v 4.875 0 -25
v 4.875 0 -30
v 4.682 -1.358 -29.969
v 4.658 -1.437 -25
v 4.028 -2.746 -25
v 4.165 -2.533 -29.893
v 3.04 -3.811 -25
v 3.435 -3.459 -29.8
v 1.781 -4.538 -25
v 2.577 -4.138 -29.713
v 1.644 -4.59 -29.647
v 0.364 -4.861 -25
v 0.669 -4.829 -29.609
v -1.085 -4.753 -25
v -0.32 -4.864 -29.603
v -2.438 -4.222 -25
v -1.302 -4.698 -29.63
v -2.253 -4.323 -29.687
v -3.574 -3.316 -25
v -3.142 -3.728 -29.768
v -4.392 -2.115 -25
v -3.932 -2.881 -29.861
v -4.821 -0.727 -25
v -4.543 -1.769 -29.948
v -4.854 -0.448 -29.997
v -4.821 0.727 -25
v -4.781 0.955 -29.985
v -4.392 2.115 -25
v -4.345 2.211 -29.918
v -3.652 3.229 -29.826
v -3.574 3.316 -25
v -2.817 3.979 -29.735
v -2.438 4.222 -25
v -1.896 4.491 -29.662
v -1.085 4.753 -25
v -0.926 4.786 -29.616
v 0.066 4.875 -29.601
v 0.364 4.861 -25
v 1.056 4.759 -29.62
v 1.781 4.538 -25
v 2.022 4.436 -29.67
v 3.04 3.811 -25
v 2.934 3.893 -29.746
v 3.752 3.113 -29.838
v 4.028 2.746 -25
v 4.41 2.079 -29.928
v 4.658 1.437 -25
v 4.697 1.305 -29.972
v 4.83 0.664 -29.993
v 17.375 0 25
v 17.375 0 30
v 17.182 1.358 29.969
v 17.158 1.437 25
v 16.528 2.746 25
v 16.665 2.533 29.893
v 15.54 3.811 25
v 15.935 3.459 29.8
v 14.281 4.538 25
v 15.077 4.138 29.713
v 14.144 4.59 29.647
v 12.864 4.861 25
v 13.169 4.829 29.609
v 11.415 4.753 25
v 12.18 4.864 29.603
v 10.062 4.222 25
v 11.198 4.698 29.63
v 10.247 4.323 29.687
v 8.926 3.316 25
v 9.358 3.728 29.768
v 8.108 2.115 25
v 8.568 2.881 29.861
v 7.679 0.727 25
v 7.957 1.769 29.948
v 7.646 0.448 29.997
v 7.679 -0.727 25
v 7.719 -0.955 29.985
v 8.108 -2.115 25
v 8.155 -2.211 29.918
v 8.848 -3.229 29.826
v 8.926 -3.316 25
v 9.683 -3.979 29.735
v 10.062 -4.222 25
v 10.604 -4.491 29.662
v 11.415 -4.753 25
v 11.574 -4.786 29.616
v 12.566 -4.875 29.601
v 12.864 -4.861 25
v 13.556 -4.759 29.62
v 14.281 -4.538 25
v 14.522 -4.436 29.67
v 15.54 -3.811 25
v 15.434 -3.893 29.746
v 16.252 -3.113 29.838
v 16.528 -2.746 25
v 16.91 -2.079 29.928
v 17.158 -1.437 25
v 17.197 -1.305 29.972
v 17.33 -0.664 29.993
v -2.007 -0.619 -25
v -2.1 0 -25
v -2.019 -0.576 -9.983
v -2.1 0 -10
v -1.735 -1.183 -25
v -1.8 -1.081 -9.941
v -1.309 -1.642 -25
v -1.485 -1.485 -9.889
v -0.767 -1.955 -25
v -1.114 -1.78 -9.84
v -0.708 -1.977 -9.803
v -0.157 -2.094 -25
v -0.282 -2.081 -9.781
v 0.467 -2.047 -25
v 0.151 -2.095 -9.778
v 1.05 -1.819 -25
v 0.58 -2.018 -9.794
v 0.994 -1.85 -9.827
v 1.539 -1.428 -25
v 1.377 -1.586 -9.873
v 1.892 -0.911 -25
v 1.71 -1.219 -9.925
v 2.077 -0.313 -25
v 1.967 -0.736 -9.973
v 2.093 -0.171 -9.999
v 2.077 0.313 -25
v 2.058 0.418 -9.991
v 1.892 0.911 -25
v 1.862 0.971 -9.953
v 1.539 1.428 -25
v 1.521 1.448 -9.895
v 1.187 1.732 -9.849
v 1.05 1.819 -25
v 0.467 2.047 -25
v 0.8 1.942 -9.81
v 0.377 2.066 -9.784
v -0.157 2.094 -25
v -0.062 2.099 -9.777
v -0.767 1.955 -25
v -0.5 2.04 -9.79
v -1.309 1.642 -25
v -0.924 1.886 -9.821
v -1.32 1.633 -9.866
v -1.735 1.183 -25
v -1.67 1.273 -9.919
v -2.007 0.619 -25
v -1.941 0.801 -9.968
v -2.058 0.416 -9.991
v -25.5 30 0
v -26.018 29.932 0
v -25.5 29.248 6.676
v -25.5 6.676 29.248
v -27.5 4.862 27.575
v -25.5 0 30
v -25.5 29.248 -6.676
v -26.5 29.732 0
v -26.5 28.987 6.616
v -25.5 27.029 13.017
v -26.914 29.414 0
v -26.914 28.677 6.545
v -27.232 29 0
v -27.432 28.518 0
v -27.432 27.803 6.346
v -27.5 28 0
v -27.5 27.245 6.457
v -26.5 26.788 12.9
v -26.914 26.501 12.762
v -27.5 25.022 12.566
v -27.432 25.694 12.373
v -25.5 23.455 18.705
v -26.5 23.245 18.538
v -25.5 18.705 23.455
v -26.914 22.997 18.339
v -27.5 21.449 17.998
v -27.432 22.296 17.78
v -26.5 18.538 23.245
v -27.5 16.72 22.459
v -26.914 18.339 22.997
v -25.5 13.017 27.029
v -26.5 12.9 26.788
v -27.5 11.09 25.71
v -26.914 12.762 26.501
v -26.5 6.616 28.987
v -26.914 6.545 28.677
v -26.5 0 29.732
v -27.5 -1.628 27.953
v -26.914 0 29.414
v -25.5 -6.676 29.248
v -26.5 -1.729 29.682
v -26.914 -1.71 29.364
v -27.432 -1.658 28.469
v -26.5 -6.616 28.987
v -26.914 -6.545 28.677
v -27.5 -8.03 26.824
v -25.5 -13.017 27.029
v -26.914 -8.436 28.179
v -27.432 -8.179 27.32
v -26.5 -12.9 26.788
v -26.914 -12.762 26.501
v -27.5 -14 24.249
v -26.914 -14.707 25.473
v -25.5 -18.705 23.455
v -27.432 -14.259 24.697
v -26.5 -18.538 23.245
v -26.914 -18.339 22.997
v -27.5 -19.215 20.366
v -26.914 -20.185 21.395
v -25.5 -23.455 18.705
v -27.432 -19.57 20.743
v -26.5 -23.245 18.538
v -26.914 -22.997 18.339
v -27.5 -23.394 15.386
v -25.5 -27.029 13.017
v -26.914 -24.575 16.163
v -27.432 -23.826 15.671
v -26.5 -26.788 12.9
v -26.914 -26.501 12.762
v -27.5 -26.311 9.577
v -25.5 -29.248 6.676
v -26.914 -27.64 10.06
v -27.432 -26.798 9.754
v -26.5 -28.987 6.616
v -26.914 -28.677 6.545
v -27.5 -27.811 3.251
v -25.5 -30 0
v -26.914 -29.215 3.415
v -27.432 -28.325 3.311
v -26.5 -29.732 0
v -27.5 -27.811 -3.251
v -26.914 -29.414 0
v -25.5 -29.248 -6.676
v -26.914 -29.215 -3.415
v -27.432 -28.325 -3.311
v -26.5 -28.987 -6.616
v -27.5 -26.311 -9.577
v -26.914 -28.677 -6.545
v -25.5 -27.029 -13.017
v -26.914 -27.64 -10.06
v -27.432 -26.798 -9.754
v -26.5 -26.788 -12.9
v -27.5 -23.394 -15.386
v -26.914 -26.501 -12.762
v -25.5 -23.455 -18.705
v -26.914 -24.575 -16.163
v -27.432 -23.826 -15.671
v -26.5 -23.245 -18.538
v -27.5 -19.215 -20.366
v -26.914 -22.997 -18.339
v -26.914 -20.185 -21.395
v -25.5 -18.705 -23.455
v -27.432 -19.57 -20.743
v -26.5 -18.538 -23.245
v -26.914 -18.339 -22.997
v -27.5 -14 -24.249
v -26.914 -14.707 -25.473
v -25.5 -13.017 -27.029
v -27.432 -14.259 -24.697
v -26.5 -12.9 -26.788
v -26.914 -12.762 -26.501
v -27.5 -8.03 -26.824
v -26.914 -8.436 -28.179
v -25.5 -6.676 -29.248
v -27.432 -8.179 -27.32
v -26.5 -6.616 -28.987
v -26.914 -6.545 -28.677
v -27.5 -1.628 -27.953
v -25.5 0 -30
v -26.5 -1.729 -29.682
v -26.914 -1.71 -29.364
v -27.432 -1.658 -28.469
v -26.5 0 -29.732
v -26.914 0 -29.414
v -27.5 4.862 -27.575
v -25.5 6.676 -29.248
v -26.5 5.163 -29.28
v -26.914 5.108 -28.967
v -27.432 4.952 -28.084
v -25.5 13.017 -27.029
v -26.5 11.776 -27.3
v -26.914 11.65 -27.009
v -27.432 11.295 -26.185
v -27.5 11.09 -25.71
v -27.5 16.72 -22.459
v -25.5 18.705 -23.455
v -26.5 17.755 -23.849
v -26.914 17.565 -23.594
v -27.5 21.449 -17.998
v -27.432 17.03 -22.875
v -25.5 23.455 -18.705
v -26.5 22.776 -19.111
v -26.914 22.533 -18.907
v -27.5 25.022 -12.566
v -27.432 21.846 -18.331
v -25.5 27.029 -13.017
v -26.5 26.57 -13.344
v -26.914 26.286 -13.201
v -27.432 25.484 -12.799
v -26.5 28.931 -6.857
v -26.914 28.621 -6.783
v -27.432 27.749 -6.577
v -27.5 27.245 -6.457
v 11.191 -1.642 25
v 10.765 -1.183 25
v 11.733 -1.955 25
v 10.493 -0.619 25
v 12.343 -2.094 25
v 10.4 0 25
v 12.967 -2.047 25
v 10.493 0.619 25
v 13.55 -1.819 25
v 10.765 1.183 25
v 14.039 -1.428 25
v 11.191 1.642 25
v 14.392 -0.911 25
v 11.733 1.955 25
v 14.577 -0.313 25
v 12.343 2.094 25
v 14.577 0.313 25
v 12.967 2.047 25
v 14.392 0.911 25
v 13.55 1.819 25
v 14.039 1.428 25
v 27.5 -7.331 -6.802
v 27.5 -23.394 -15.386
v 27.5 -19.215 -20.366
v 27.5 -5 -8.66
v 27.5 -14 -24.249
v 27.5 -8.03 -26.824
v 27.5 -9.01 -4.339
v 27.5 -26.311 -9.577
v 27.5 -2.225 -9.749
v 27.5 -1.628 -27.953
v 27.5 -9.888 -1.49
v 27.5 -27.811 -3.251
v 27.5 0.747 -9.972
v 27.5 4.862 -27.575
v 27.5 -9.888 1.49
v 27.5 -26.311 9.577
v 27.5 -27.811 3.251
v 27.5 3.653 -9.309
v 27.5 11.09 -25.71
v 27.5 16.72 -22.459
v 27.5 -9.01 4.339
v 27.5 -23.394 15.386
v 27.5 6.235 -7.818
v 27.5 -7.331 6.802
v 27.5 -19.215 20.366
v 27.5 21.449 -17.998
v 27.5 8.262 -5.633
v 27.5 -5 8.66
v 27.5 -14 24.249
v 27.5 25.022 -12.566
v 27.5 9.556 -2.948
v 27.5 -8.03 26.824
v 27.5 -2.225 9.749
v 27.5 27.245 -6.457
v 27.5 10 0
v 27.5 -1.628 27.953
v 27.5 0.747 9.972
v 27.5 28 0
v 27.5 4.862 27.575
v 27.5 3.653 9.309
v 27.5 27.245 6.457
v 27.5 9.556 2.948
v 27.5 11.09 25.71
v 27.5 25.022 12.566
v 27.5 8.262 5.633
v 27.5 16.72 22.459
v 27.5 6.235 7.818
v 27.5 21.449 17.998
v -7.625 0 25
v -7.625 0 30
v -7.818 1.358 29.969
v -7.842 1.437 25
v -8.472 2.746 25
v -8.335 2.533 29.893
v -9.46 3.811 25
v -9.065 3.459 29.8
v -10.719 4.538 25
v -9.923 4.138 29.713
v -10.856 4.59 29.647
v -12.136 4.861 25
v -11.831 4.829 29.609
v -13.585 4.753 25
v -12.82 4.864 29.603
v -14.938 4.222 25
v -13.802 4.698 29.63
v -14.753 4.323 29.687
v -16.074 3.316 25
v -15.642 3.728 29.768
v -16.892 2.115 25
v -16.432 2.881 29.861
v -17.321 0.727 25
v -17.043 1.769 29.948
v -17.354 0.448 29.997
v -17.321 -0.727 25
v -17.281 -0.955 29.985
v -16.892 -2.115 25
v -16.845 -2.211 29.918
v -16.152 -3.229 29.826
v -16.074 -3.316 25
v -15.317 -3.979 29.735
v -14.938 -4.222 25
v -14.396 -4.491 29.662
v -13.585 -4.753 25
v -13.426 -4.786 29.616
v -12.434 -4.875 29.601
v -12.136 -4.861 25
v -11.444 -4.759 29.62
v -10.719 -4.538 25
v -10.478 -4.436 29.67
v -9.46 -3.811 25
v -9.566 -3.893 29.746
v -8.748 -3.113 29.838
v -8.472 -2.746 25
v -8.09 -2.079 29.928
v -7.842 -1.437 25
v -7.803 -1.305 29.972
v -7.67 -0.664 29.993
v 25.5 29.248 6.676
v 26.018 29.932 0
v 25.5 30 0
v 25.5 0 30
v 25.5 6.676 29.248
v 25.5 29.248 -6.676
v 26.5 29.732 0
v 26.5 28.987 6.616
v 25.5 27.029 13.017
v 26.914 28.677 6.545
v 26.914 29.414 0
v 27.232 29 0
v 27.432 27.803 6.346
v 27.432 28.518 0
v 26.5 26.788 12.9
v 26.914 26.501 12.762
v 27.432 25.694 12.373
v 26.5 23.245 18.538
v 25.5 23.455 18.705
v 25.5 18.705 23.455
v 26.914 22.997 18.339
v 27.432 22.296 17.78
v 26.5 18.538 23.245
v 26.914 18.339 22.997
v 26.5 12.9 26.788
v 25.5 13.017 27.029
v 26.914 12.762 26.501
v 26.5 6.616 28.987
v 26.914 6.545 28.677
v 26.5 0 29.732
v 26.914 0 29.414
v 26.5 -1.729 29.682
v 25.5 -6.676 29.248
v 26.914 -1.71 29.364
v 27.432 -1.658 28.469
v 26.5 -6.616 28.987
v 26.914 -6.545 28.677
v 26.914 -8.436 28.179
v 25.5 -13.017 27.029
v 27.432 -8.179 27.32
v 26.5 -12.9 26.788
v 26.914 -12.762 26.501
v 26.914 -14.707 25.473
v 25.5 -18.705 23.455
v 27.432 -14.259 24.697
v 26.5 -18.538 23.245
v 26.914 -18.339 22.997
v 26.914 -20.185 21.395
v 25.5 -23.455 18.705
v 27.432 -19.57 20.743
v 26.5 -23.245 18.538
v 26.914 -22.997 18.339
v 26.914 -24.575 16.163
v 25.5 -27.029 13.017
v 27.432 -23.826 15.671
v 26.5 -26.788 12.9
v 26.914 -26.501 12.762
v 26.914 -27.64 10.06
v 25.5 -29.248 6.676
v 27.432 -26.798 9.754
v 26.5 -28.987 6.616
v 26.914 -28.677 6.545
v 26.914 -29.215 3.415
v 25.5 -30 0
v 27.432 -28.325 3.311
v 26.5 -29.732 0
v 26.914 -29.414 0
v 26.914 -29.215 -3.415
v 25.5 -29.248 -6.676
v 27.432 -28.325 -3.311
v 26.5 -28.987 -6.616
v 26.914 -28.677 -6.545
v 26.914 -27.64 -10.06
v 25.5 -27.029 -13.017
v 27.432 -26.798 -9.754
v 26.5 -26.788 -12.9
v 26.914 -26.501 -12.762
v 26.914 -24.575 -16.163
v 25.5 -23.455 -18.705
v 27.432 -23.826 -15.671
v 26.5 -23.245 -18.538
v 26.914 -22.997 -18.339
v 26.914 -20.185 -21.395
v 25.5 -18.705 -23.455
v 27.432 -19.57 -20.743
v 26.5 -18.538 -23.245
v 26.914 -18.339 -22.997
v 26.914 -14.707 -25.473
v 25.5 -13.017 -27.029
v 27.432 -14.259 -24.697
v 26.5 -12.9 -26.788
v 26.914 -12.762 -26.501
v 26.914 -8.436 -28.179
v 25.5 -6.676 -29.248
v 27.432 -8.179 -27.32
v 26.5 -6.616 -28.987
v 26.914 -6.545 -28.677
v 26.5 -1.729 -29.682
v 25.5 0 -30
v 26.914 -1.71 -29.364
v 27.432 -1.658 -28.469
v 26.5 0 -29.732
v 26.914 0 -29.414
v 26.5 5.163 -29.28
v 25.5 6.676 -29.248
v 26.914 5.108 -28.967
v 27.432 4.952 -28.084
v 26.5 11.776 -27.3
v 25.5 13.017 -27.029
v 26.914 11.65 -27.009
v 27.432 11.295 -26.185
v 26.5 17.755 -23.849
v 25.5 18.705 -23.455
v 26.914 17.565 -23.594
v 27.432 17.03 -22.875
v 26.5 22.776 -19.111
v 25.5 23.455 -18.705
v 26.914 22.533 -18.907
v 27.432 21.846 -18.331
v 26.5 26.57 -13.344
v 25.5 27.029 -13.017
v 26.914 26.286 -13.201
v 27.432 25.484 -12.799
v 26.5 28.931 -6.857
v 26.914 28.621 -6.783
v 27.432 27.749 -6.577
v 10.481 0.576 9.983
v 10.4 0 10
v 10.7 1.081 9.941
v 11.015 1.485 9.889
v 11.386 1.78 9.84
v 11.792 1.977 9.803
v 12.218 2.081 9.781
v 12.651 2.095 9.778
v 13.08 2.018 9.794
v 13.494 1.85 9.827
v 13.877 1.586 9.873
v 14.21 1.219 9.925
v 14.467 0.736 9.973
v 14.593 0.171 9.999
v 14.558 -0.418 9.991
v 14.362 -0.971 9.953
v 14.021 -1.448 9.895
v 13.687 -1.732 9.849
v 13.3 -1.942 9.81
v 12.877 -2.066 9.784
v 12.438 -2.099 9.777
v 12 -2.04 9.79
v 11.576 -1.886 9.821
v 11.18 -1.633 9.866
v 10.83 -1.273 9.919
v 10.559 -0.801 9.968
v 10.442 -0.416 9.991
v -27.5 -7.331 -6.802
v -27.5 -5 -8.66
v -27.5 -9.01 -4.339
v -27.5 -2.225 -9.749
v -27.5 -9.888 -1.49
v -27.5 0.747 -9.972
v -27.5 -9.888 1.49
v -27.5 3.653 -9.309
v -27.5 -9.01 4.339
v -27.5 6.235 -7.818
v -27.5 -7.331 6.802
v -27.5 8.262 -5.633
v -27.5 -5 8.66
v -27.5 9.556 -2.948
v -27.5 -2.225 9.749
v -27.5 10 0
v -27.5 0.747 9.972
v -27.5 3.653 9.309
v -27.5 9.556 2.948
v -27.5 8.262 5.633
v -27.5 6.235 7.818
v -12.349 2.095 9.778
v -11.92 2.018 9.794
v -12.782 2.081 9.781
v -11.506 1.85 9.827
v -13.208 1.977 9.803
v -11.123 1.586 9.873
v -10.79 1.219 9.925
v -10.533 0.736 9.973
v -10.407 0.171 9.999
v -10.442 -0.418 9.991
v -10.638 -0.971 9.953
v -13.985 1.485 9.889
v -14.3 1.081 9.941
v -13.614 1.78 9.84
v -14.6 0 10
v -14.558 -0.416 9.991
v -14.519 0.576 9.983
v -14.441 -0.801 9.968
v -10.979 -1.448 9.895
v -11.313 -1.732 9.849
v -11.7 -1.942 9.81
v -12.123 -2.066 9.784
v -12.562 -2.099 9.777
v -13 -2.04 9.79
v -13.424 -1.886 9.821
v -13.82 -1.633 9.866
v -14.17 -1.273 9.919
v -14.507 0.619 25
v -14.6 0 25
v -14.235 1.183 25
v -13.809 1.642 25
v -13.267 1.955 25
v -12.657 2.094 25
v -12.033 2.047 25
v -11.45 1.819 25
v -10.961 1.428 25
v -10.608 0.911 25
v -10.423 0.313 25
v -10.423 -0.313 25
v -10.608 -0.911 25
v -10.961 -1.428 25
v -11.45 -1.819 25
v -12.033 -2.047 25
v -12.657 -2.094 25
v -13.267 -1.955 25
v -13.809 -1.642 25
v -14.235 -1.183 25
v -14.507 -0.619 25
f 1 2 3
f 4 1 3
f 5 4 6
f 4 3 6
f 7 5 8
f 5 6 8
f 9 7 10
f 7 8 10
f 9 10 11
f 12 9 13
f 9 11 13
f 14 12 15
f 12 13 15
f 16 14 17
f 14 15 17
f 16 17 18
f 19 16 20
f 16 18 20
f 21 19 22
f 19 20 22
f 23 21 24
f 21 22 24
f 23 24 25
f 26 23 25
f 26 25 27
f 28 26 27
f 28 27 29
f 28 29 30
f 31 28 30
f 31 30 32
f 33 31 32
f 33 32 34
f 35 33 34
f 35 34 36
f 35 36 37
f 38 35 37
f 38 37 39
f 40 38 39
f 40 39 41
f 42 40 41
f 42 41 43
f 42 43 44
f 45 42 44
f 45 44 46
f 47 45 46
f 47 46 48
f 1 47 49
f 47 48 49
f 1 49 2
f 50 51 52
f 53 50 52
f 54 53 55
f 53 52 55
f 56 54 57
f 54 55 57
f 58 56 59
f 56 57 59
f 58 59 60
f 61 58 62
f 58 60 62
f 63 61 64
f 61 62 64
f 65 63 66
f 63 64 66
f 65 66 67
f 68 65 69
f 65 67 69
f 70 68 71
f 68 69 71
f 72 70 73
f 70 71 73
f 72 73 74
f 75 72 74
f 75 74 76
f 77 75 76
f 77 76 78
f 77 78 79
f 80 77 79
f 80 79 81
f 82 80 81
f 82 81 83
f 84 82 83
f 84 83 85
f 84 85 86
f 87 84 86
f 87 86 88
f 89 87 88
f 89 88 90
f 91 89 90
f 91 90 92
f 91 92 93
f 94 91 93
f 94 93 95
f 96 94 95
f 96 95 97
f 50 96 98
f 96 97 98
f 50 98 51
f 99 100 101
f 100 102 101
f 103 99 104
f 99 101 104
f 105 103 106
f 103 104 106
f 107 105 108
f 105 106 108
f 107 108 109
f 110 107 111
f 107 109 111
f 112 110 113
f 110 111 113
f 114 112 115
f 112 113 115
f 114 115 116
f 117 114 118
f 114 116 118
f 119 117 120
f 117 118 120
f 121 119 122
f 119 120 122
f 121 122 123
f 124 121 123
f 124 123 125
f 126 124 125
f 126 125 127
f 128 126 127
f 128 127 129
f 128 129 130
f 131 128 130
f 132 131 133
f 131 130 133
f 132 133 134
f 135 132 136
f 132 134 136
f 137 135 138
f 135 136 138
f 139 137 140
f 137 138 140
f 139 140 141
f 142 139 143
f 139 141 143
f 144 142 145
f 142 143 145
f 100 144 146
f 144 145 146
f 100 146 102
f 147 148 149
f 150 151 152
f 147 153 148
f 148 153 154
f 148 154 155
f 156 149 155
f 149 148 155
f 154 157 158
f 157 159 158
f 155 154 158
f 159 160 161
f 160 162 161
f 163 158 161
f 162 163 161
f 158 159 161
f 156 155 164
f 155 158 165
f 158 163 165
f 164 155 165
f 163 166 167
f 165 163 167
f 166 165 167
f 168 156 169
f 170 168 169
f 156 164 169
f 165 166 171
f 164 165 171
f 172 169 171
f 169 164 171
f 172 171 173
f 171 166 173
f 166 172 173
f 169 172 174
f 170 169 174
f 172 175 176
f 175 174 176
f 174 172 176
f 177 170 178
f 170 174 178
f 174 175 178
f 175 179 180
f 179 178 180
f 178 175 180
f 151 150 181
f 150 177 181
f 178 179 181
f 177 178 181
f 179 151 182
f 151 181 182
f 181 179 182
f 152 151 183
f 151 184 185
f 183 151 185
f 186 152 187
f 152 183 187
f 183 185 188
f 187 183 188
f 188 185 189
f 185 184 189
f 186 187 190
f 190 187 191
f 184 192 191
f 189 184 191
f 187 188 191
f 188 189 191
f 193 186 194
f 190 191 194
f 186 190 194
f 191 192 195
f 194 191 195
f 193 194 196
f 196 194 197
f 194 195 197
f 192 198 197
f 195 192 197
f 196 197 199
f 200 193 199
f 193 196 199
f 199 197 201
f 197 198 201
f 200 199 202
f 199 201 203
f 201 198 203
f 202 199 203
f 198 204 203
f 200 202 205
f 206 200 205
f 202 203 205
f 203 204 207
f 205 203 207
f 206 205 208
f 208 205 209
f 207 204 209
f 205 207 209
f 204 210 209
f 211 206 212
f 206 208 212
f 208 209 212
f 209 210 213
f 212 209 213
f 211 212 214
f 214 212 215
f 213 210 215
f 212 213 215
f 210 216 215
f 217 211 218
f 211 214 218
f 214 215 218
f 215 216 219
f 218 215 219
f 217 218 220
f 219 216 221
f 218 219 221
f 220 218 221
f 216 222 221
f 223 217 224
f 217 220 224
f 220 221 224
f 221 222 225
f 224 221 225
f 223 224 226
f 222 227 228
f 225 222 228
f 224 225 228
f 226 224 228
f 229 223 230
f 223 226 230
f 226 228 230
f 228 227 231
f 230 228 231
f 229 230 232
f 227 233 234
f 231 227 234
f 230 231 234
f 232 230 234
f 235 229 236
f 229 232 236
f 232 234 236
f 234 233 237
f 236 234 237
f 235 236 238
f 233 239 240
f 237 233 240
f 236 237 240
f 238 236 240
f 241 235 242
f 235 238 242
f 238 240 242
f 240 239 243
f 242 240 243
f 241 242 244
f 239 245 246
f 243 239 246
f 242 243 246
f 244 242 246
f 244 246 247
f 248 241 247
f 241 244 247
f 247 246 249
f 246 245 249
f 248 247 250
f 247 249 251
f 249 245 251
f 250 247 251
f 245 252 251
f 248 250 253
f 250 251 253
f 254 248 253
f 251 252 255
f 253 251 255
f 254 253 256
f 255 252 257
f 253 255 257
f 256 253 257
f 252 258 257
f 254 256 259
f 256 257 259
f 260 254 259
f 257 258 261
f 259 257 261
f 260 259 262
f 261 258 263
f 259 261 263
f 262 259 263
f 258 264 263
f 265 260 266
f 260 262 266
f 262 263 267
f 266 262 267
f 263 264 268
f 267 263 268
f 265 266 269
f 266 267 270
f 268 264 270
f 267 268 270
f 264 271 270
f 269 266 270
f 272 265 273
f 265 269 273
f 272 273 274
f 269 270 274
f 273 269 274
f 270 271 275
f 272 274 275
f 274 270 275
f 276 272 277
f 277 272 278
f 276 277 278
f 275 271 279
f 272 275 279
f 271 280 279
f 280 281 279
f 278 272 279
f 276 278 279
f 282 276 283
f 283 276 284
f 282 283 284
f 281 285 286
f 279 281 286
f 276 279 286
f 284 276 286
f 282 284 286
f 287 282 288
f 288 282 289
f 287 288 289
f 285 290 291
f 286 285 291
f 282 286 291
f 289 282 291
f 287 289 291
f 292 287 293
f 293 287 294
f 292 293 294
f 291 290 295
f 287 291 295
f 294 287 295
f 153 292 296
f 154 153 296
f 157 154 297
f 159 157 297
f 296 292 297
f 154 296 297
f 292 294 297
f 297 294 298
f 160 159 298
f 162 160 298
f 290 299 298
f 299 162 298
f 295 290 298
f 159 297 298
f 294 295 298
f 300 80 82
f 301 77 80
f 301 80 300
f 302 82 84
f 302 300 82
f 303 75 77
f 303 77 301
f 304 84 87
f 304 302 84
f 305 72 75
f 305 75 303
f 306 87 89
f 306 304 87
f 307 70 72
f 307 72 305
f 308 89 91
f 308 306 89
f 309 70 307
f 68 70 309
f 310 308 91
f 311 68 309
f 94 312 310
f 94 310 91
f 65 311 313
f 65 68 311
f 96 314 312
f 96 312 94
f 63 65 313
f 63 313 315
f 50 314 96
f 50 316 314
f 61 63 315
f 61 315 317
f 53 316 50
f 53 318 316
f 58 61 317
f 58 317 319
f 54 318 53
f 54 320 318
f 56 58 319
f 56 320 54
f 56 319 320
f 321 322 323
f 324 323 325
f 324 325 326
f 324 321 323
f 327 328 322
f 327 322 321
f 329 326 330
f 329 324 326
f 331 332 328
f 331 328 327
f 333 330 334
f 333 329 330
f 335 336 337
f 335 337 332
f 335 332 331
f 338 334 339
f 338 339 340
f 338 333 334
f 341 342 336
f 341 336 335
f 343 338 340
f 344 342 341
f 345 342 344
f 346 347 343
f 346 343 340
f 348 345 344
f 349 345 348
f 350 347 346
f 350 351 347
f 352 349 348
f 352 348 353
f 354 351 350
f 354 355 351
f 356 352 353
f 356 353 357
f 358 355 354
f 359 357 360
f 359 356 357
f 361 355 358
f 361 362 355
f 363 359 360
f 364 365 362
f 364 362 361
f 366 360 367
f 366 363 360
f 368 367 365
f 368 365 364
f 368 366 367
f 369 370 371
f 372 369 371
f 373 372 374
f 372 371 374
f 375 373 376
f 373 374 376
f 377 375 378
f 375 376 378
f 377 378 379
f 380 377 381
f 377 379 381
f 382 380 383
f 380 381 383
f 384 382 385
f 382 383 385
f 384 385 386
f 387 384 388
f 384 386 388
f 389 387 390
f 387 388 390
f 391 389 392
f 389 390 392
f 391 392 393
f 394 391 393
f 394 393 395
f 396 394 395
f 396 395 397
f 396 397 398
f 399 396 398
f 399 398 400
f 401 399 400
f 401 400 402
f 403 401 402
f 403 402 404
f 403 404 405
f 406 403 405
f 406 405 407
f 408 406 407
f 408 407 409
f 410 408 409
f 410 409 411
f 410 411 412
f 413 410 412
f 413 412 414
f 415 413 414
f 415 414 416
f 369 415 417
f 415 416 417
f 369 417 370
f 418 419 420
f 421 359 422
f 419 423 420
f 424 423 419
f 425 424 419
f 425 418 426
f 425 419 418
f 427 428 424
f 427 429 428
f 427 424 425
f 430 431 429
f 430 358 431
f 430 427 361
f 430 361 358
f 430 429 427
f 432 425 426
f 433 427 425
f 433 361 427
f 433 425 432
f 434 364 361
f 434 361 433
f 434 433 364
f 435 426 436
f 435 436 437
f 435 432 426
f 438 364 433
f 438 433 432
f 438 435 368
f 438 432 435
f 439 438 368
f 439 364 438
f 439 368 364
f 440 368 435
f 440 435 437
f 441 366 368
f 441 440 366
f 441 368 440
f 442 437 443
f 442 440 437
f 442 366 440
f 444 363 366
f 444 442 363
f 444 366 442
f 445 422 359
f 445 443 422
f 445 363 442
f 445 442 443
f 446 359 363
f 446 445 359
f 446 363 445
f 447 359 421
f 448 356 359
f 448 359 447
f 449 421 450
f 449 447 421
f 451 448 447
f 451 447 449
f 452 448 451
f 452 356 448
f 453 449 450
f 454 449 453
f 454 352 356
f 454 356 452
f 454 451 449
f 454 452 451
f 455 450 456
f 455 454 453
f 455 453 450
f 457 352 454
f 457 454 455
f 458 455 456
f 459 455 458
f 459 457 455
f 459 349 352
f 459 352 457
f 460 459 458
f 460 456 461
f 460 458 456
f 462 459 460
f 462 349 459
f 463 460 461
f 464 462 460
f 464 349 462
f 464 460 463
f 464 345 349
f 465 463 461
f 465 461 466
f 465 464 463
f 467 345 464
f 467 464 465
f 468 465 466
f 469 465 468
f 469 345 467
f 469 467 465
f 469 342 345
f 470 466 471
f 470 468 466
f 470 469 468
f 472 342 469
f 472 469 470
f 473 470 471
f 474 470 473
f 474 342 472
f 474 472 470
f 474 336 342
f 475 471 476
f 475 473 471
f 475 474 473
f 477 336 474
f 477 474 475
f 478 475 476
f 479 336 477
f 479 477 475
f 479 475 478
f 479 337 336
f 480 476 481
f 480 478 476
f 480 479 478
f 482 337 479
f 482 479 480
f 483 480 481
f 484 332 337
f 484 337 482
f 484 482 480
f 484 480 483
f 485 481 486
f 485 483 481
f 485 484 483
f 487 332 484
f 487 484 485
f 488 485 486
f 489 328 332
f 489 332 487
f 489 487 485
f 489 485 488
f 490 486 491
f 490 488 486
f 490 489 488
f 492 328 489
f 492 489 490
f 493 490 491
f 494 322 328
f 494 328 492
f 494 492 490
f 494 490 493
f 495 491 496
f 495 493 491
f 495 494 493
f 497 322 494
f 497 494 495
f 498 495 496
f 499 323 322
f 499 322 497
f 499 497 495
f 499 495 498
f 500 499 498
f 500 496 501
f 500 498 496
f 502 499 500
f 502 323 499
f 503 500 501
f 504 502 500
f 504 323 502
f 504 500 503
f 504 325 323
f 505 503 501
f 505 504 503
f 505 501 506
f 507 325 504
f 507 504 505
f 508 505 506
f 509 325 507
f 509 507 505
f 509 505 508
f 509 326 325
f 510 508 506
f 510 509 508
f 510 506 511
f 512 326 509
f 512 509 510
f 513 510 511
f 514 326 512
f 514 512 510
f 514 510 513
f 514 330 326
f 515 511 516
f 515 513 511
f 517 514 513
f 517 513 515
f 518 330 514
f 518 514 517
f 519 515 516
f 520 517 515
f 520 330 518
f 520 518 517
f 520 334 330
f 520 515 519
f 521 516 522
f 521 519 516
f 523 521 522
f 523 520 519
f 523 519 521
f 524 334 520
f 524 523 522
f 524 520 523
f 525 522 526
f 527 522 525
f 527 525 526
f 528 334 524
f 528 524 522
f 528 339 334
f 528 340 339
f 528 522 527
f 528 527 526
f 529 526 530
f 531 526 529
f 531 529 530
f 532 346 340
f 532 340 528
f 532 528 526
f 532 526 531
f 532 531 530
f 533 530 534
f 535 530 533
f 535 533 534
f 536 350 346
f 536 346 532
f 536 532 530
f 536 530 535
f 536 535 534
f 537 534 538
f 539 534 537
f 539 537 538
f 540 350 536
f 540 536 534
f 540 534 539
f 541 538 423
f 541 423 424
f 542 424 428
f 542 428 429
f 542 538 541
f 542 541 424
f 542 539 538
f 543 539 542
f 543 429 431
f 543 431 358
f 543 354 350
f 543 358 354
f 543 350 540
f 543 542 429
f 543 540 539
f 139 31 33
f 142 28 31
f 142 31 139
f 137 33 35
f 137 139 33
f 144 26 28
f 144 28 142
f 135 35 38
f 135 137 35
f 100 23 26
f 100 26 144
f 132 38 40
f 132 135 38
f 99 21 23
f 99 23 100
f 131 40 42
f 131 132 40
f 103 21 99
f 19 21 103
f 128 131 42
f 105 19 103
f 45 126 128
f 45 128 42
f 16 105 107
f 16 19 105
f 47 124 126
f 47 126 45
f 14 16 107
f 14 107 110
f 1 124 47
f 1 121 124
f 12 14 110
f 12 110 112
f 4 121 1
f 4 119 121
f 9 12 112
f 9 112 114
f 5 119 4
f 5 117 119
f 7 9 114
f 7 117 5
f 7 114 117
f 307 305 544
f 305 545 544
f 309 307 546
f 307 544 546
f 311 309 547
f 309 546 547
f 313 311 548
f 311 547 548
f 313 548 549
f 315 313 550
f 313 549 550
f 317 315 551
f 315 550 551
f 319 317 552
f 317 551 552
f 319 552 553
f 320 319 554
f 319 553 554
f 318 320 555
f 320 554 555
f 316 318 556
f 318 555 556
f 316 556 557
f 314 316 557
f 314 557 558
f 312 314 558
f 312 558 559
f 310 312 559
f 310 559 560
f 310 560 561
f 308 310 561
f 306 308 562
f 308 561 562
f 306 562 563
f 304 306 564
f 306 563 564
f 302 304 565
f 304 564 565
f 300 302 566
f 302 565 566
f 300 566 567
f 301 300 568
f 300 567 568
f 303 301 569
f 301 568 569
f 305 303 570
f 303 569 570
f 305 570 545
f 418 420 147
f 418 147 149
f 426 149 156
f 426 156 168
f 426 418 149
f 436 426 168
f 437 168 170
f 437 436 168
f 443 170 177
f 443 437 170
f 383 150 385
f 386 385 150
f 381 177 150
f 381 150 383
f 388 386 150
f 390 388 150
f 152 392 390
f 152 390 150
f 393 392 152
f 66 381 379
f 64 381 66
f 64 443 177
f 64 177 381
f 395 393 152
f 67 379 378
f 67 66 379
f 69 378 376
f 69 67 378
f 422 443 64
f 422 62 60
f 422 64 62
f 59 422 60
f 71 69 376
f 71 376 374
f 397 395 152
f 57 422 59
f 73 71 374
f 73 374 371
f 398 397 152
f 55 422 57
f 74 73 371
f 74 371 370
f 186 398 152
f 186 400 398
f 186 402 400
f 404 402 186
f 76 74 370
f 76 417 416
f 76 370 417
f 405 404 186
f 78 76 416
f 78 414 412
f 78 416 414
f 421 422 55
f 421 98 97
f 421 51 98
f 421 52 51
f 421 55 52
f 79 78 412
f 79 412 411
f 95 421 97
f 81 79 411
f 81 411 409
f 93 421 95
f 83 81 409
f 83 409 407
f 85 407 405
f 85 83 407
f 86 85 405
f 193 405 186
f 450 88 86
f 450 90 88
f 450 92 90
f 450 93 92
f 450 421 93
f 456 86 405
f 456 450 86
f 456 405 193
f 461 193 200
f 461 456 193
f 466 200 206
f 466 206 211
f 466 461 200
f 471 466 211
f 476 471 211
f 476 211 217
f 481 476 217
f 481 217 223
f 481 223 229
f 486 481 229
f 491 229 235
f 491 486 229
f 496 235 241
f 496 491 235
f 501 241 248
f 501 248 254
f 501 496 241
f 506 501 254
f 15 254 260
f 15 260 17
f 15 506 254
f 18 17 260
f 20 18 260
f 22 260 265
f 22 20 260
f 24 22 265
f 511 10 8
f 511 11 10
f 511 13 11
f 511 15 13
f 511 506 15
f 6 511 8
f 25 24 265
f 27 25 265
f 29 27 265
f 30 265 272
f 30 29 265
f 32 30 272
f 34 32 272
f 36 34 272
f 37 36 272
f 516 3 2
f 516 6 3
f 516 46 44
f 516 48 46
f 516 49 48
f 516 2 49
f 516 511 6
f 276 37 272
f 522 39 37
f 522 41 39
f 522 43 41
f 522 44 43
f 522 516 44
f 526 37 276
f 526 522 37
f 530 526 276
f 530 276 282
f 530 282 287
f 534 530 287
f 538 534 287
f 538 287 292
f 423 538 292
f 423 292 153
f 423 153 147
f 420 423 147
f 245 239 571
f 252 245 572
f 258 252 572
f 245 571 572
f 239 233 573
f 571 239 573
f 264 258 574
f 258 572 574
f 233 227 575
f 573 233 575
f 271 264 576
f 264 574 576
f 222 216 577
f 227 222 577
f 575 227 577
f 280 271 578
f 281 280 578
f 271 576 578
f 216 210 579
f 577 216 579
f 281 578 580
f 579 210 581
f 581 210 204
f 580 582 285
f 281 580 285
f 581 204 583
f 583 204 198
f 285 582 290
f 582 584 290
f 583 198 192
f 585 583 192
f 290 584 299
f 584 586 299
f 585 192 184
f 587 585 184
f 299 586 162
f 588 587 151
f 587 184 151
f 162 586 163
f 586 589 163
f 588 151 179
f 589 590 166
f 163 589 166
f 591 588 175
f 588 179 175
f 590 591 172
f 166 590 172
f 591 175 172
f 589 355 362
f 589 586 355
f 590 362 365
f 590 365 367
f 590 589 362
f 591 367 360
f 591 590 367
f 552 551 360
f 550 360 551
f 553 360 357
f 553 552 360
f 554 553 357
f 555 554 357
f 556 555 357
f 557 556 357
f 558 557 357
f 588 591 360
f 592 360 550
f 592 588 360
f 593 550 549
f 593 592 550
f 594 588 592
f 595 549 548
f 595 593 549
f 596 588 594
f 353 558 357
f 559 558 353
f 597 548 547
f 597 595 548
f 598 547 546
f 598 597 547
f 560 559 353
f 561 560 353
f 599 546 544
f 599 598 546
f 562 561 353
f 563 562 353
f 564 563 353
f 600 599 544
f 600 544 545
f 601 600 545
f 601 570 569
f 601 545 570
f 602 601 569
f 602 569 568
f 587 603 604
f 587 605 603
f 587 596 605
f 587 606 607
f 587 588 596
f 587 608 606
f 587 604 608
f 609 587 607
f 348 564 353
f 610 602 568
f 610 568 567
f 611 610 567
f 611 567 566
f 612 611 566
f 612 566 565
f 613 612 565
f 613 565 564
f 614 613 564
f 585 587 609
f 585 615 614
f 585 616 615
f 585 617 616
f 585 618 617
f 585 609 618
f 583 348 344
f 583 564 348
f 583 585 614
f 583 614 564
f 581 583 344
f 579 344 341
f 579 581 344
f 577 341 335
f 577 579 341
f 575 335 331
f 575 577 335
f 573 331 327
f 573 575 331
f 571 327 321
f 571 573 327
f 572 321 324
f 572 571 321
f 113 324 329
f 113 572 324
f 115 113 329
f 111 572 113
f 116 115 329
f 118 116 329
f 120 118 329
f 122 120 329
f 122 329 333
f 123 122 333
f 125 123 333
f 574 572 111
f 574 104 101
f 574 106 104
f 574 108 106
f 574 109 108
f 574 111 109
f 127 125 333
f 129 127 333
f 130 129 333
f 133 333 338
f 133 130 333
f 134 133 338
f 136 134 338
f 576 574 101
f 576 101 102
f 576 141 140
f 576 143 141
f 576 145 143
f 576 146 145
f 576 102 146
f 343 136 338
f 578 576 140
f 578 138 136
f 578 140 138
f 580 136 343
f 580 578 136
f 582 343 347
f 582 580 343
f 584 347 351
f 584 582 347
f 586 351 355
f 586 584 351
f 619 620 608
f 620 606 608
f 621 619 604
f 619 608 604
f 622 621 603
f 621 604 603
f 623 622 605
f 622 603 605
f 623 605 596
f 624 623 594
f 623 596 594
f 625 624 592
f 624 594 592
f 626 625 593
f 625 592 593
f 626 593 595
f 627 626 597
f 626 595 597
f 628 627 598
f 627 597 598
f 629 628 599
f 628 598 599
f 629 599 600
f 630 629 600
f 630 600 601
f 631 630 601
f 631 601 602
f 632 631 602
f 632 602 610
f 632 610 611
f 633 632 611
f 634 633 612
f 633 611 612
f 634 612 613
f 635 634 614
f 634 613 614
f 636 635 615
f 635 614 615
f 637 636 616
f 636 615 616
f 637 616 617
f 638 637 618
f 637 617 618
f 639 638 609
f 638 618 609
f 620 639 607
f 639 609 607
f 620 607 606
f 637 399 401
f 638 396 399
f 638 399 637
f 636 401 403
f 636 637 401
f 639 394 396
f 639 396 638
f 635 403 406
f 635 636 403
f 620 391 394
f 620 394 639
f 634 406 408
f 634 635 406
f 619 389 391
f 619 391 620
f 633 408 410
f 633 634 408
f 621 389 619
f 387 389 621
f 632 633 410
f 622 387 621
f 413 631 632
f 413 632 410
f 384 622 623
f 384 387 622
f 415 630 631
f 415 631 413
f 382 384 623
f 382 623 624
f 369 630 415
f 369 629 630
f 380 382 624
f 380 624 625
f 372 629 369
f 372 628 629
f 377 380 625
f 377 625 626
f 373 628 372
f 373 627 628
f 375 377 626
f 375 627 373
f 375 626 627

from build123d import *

# Parameters (mm, degrees)
F2_R           = 30
F2_R_2         = 10
F5_DEPTH       = 27.5
F6_R           = 2
F7_D           = 4.2
F7_DEPTH       = 22
F7_CBORE_D     = 9.75
F7_CBORE_DEPTH = 5
F7_TIP         = 1.2618073
F8_D           = 4.2
F8_DEPTH       = 22
F8_CBORE_D     = 9.75
F8_CBORE_DEPTH = 5
F8_TIP         = 1.2618073


with BuildPart() as f5:
    # F2 (on Right) → F5 (new body, symmetric)
    with BuildSketch(Plane.YZ):
        Circle(F2_R)
        Circle(F2_R_2, mode=Mode.SUBTRACT)
    extrude(amount=F5_DEPTH, both=True)

    # F6
    f6_edges = [f5.edges().sort_by_distance(p)[0] for p in [
        (27.5, -30, 0),
        (-27.5, -30, 0),
    ]]
    fillet(f6_edges, radius=F6_R)

    # F7
    with Locations(Plane.XY.offset(30)):
        with Locations((-12.5, 0), (12.5, 0)):
            CounterBoreHole(F7_D / 2, F7_CBORE_D / 2, F7_CBORE_DEPTH, depth=F7_DEPTH)
            with Locations((0, 0, -(F7_DEPTH + F7_TIP / 2))):  # 118° drill point
                Cone(0, F7_D / 2, F7_TIP, mode=Mode.SUBTRACT)

    # F8
    with Locations(Plane(origin=(0, 0, -30), x_dir=(1, 0, 0), z_dir=(0, 0, -1))):
        with Locations((0, 0)):
            CounterBoreHole(F8_D / 2, F8_CBORE_D / 2, F8_CBORE_DEPTH, depth=F8_DEPTH)
            with Locations((0, 0, -(F8_DEPTH + F8_TIP / 2))):  # 118° drill point
                Cone(0, F8_D / 2, F8_TIP, mode=Mode.SUBTRACT)


solid = f5.part
